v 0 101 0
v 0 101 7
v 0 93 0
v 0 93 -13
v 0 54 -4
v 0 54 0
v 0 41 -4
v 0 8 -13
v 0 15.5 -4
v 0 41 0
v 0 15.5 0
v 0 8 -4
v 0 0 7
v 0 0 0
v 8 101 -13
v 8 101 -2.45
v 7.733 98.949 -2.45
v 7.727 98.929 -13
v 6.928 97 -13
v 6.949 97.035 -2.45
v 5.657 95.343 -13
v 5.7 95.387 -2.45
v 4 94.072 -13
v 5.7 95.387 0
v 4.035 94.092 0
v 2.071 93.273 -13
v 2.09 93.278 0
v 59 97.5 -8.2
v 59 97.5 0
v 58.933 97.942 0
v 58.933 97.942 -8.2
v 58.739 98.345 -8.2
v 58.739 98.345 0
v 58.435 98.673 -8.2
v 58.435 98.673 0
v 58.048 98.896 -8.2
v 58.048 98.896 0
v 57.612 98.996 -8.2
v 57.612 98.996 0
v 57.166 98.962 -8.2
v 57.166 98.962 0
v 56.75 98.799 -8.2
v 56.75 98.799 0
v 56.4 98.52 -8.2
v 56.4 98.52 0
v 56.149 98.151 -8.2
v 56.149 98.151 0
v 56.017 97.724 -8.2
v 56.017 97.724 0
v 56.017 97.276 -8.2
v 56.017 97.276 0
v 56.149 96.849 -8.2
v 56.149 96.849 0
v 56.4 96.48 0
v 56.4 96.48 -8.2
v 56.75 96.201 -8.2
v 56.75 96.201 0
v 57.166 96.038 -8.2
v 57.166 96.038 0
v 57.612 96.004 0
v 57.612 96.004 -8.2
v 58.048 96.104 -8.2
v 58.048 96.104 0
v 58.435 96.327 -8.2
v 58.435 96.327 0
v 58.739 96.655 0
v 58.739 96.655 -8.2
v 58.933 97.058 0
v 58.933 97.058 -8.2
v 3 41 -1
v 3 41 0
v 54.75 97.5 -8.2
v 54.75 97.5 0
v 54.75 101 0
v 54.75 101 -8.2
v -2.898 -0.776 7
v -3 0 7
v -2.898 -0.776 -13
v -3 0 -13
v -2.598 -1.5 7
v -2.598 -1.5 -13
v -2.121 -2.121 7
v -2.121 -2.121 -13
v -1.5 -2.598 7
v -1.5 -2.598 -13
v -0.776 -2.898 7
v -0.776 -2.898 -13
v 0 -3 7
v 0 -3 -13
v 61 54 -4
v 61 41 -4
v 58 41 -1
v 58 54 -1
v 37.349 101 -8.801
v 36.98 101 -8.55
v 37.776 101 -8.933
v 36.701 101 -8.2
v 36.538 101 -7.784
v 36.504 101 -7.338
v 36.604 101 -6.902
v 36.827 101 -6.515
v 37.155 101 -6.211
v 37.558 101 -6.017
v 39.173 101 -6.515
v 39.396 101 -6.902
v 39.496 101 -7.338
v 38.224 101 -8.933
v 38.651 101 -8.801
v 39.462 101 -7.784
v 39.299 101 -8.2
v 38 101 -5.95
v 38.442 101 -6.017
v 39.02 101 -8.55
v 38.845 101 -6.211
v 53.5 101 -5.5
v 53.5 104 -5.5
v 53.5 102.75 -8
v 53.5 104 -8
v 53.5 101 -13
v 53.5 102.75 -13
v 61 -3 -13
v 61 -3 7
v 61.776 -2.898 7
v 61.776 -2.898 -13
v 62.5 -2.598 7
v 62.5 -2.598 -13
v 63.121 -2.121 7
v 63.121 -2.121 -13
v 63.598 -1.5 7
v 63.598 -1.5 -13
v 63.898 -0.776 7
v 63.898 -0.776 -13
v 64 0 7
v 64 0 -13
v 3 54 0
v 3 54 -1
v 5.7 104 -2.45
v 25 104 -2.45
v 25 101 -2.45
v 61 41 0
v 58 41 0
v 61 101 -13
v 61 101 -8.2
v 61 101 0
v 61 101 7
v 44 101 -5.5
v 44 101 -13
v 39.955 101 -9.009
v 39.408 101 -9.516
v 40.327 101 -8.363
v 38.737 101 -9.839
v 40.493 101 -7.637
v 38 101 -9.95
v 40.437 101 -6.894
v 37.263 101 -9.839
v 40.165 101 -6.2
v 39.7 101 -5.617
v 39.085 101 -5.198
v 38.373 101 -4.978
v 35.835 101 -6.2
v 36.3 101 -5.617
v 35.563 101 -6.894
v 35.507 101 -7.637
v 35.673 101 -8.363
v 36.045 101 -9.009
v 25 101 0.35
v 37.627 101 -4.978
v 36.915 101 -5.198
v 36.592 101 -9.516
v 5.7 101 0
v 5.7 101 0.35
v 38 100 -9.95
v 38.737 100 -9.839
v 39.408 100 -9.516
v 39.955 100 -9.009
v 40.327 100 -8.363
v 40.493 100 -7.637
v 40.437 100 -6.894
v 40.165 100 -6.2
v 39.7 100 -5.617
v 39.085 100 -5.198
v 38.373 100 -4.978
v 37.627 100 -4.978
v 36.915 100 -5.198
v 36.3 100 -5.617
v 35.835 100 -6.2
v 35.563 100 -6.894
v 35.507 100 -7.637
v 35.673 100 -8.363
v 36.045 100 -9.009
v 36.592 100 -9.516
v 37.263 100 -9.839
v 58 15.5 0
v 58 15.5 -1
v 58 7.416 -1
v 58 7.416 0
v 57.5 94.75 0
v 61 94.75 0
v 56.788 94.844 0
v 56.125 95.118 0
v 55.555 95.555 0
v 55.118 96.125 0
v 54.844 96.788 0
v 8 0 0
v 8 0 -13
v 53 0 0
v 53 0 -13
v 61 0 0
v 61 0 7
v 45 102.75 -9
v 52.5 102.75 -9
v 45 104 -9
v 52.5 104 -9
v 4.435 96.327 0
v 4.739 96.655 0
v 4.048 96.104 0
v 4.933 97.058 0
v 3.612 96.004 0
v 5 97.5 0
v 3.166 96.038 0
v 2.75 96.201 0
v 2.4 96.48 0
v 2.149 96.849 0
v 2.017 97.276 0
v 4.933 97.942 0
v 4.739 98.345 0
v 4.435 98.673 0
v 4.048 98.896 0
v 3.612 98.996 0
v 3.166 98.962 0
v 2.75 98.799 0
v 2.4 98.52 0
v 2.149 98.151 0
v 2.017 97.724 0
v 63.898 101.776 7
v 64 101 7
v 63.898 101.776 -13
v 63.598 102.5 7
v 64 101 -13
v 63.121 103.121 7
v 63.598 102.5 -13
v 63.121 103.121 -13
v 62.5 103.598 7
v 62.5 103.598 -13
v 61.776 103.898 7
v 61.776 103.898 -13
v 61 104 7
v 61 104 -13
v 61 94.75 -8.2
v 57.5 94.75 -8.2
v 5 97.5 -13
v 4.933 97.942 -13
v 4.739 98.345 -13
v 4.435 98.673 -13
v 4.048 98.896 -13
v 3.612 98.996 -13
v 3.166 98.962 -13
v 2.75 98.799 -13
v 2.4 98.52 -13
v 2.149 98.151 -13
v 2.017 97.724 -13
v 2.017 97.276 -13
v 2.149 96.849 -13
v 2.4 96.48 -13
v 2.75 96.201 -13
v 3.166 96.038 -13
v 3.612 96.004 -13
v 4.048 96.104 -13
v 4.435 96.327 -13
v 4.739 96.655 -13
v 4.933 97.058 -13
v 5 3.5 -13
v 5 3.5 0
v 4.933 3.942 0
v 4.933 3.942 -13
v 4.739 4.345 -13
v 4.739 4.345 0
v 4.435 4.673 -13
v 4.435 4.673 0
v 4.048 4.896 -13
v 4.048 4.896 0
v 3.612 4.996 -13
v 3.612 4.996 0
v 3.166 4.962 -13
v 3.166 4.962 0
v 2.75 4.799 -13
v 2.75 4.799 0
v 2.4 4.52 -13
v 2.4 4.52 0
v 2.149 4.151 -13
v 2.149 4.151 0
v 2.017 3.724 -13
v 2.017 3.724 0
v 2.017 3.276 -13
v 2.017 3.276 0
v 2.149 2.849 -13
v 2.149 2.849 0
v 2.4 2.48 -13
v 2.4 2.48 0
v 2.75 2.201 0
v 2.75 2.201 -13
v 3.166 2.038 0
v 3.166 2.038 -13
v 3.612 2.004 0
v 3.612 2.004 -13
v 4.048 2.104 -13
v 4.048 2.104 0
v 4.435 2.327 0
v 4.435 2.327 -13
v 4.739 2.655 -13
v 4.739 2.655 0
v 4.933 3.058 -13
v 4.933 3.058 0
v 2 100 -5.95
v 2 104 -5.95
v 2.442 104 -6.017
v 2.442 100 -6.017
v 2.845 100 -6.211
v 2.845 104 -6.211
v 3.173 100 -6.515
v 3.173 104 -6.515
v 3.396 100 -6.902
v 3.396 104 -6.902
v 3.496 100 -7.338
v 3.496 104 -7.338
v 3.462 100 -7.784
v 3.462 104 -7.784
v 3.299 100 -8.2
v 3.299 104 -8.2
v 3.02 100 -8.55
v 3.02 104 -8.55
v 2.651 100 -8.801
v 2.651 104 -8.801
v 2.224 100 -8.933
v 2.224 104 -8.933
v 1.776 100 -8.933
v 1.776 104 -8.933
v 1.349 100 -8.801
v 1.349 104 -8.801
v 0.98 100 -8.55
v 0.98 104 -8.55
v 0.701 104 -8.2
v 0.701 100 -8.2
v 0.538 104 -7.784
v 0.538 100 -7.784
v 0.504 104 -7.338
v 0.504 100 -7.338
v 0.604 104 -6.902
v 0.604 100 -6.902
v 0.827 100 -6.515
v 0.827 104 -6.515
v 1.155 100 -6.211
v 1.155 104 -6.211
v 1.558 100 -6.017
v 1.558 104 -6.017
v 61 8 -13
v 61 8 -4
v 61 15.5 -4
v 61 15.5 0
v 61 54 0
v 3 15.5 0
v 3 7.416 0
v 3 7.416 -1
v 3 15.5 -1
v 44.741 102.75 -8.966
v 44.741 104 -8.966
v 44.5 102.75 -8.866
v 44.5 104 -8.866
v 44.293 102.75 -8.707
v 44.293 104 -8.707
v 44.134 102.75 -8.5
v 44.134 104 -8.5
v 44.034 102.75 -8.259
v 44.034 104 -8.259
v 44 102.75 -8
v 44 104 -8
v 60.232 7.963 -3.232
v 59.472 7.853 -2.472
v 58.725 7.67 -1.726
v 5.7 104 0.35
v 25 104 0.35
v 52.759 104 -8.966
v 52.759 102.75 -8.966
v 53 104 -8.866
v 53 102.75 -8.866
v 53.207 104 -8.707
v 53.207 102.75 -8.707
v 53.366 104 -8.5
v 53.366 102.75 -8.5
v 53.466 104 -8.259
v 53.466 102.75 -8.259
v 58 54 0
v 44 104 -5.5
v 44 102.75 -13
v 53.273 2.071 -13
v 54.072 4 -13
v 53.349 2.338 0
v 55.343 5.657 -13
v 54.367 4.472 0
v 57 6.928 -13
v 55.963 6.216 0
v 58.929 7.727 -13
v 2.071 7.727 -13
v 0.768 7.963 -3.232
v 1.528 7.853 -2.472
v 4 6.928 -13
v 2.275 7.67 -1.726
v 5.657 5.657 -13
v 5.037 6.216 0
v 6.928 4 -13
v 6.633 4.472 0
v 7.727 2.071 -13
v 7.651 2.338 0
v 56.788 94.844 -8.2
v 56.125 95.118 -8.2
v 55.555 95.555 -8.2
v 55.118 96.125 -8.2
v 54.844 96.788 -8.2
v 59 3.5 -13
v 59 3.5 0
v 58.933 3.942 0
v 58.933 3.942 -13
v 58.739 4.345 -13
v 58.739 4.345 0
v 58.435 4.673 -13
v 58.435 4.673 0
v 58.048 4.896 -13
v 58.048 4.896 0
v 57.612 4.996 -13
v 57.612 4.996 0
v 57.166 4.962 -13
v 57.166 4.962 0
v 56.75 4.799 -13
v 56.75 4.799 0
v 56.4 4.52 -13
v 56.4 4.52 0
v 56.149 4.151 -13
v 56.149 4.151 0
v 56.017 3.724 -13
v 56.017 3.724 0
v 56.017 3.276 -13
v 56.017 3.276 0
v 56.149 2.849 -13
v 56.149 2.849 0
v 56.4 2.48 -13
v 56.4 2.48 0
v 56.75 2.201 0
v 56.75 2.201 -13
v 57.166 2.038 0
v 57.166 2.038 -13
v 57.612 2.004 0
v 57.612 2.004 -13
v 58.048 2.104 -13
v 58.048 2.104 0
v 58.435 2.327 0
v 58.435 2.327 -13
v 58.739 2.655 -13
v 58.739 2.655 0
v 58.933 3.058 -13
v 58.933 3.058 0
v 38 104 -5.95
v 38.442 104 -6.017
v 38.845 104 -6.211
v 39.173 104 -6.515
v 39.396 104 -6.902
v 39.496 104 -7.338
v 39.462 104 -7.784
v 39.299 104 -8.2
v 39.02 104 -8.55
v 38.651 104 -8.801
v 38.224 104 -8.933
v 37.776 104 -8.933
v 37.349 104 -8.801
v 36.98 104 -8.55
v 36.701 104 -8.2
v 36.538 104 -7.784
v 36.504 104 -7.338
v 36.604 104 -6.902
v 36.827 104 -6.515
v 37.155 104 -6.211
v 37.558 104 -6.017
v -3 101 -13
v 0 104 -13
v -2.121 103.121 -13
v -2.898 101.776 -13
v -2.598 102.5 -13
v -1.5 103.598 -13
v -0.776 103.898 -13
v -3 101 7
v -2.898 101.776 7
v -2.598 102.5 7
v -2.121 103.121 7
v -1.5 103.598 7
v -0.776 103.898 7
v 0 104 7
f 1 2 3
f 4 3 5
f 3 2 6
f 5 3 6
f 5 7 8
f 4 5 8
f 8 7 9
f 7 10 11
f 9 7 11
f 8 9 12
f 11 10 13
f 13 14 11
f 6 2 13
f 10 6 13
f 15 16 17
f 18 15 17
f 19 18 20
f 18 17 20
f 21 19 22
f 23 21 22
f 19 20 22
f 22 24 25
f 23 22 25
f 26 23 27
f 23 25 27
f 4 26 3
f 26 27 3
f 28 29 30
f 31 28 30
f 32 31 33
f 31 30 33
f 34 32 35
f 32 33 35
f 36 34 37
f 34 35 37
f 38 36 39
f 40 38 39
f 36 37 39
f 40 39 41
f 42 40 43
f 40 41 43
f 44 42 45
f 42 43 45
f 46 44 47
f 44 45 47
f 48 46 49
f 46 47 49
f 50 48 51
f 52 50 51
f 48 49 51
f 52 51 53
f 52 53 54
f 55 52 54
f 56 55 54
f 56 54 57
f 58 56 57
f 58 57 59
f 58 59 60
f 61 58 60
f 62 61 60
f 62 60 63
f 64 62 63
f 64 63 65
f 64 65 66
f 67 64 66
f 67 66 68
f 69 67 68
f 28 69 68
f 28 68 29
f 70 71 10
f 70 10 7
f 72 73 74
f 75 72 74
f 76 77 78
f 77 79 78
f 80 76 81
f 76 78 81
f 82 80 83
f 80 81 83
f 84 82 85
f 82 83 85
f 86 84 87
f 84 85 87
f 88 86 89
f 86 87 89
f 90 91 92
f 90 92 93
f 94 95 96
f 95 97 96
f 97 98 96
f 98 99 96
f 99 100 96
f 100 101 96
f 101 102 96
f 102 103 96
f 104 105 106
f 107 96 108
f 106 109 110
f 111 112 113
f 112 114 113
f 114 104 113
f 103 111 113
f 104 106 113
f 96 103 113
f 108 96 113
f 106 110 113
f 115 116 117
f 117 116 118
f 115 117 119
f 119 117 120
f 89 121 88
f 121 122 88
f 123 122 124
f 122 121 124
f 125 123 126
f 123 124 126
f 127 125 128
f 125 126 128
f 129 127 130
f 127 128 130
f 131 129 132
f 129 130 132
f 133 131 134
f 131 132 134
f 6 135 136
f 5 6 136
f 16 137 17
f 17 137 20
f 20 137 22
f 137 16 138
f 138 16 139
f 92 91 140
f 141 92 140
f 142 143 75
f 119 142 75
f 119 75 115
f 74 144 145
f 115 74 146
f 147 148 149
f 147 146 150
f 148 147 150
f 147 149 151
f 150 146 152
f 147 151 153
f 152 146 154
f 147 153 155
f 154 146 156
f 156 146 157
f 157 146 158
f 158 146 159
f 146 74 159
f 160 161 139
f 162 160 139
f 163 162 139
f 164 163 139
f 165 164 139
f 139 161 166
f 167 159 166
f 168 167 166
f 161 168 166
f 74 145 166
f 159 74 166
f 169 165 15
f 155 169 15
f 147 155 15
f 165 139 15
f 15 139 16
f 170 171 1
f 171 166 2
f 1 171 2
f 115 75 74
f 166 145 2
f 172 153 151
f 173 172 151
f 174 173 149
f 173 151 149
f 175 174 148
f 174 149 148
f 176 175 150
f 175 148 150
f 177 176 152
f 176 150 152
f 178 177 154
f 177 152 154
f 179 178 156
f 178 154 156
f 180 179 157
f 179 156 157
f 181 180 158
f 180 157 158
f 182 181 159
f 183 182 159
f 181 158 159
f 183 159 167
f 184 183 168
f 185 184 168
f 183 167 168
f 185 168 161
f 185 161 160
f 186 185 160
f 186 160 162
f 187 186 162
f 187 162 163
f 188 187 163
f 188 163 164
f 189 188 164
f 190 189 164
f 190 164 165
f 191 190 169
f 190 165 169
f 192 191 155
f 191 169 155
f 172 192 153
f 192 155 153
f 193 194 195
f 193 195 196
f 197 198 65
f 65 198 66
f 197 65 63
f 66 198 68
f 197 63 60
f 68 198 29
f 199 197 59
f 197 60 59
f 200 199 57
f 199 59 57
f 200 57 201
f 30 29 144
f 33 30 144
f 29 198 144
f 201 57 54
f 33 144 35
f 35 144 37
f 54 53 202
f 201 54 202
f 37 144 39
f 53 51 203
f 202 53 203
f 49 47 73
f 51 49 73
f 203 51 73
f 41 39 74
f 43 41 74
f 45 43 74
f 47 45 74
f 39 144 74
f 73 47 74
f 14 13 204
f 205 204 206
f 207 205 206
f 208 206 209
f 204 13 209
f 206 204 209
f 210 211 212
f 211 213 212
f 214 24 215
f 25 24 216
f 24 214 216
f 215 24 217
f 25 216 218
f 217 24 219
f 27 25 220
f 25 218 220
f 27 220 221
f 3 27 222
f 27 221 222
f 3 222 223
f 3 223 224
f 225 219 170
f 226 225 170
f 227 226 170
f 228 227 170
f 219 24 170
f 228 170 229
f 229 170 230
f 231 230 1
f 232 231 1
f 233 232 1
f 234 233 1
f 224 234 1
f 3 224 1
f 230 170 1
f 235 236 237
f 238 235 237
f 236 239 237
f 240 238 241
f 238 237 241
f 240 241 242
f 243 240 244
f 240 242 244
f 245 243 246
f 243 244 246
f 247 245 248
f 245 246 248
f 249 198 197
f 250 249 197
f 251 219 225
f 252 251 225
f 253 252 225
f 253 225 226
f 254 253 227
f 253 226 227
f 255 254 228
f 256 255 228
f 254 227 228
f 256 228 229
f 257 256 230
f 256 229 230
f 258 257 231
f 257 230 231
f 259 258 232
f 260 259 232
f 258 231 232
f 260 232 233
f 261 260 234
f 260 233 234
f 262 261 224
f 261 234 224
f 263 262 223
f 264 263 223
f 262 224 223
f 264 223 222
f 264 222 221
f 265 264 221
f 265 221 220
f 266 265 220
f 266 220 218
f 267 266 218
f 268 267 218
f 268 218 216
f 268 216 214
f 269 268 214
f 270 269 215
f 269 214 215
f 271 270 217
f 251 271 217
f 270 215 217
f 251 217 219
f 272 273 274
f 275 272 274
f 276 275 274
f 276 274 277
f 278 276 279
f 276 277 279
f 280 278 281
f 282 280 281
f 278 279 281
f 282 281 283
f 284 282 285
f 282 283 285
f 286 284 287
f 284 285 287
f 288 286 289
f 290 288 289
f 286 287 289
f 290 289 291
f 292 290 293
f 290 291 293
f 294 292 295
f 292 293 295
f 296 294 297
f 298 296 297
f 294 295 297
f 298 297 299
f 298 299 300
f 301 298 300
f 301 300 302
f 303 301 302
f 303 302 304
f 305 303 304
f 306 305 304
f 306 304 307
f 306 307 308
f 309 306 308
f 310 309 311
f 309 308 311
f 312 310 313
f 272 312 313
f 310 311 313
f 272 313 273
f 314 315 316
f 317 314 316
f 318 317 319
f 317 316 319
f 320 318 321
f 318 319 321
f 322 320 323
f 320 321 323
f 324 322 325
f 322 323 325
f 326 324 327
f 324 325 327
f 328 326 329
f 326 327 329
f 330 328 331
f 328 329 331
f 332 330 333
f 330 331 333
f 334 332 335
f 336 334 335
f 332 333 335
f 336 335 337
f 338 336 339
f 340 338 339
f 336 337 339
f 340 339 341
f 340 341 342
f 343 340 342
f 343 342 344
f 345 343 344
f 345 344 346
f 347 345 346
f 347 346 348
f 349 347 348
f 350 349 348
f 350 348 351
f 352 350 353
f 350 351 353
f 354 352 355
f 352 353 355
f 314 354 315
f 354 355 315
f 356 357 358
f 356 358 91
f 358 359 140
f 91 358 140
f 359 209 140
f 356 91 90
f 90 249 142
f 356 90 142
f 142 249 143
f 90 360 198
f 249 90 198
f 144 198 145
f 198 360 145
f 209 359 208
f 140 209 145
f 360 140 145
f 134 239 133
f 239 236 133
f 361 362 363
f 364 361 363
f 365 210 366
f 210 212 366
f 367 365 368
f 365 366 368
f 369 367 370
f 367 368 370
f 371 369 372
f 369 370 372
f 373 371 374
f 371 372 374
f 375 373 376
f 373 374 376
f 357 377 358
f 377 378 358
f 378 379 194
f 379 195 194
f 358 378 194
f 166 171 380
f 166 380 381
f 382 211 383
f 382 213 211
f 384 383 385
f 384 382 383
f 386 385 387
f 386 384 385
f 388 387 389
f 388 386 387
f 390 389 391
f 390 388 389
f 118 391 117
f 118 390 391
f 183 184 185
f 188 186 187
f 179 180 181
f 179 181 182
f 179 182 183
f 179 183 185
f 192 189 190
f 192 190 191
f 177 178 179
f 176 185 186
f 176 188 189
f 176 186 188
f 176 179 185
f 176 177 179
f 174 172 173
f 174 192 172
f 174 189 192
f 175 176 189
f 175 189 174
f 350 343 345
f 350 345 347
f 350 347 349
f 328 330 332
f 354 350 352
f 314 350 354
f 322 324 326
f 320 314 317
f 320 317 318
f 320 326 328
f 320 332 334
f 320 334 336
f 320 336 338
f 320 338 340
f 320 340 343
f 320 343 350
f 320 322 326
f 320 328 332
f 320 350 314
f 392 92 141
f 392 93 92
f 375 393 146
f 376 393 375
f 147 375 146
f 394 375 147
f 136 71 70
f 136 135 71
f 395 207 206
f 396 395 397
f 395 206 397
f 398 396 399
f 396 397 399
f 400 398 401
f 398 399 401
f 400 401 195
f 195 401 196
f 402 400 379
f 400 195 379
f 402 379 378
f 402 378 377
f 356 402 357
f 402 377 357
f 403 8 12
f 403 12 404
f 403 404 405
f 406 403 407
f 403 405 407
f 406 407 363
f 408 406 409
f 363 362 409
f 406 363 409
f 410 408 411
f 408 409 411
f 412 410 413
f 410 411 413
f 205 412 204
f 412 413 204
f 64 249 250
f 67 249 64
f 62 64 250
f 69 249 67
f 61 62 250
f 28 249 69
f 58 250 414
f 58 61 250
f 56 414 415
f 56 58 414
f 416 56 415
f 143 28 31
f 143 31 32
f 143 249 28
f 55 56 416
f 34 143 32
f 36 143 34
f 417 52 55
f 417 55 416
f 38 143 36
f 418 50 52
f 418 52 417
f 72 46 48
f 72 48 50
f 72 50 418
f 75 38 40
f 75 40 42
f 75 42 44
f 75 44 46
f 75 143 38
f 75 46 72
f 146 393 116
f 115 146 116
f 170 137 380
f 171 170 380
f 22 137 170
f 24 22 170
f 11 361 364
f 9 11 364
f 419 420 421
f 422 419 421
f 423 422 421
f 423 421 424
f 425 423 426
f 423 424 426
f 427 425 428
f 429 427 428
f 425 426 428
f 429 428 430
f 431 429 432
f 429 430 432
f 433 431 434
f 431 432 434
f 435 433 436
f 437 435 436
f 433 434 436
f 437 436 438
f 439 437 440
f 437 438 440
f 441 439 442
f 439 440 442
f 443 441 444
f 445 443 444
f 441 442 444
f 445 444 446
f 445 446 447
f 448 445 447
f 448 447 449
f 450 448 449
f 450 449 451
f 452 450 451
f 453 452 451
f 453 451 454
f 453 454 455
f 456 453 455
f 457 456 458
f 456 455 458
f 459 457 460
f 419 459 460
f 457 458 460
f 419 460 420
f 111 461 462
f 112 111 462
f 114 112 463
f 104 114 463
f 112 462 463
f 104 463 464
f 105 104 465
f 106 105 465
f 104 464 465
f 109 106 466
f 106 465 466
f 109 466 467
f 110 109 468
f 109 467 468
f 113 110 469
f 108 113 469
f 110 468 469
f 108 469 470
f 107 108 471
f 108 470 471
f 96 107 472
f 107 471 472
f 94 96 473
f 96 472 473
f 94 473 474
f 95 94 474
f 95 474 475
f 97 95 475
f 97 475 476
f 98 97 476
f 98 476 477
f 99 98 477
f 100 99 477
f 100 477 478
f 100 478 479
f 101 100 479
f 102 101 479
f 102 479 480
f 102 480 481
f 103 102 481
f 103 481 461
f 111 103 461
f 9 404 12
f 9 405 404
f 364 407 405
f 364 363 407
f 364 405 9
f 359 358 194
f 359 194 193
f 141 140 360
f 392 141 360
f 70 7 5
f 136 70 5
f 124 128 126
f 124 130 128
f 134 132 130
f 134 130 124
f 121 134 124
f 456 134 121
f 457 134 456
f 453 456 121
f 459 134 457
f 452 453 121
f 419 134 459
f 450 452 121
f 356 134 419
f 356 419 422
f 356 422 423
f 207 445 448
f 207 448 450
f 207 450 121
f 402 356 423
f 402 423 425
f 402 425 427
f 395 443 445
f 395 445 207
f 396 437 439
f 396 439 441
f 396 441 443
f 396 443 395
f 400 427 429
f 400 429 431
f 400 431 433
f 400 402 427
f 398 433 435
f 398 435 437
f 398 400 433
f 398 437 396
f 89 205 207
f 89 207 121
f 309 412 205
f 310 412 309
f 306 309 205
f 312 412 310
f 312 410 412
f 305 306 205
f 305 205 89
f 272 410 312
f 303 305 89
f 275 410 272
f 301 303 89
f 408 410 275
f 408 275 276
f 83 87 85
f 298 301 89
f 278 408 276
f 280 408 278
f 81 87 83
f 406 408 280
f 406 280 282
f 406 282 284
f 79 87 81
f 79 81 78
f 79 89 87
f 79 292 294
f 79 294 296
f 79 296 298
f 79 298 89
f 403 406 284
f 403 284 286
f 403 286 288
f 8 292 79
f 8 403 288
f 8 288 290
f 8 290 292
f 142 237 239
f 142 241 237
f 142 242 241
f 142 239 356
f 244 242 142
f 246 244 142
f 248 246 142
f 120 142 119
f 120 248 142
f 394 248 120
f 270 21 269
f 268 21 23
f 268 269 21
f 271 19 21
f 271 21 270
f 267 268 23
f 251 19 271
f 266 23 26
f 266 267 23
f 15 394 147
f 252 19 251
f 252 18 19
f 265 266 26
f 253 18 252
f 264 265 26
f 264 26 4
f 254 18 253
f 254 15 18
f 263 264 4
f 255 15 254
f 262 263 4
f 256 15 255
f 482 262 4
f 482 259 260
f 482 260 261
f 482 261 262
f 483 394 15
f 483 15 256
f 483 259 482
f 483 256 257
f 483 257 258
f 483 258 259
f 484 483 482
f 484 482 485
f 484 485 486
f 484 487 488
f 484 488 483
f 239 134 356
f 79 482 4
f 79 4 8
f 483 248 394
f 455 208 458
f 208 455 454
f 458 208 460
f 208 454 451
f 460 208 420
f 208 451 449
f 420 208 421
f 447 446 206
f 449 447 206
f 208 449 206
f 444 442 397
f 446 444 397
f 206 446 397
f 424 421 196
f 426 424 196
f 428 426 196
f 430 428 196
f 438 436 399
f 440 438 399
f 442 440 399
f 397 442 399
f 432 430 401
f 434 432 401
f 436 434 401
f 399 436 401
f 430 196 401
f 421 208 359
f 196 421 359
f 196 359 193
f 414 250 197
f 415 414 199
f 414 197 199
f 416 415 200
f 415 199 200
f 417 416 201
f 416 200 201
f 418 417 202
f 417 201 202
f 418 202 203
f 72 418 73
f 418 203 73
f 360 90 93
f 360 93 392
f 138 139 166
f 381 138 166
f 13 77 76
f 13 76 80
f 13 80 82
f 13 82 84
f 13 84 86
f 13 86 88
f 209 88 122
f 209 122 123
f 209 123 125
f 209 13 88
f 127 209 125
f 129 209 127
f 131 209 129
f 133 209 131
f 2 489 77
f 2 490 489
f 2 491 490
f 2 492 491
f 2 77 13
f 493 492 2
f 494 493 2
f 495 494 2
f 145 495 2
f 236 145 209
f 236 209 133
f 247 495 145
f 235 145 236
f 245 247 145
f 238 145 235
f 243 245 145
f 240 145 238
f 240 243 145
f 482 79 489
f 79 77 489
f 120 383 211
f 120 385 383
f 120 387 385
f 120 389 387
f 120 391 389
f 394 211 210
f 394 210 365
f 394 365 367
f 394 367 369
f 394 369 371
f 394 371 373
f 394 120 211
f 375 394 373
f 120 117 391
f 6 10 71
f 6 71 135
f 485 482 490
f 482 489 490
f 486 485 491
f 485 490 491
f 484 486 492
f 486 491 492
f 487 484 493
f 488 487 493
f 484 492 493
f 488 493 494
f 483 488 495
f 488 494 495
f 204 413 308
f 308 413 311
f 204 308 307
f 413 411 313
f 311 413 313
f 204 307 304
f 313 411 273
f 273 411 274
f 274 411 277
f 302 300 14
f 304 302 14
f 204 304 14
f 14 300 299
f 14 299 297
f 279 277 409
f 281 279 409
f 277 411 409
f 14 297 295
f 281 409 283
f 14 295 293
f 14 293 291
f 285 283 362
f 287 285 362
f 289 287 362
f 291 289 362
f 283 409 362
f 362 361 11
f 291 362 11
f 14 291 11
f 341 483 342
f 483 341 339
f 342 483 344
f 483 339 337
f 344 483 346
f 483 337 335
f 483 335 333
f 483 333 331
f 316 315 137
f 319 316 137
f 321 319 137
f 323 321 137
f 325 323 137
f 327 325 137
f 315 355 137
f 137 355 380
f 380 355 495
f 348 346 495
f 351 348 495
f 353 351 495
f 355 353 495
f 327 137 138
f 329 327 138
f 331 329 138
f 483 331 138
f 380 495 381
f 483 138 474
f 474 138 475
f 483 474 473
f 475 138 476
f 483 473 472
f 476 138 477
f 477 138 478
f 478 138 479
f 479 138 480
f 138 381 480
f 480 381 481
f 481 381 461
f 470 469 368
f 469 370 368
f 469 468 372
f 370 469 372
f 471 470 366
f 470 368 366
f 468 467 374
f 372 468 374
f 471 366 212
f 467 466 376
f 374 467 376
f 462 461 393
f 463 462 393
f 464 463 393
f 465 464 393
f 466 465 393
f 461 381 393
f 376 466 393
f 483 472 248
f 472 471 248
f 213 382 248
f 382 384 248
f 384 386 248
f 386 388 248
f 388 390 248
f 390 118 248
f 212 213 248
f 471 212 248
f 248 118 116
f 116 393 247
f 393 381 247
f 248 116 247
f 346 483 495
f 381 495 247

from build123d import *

# Parameters (mm, degrees)
SKICA1_W                 = 67
SKICA1_H                 = 107
SKICA1_W_2               = 61
SKICA1_H_2               = 101
P_IDAT_VYSUNUT_M1_DEPTH  = 7
P_IDAT_VYSUNUT_M2_DEPTH  = 13
SKICA3_R                 = 1.5
ODEBRAT_VYSUNUT_M1_DEPTH = 13
ODEBRAT_START            = -4.8
ODEBRAT_VYSUNUT_M2_DEPTH = 4.8
ODEBRAT_VYSUNUT_M4_DEPTH = 123.804723036
ZAOBLIT1_R               = 3
SKICA5_W                 = 4
SKICA5_H                 = 8.5
SKICA5_H_2               = 13
P_IDAT_VYSUNUT_M3_DEPTH  = 3
ZKOSEN_1_SIZE            = 3
SKICA6_W                 = 4
SKICA6_H                 = 8.5
SKICA6_H_2               = 13
P_IDAT_VYSUNUT_M4_DEPTH  = 3
ZKOSEN_2_SIZE            = 3
SKICA7_W                 = 9.5
SKICA7_H                 = 7.5
ODEBRAT_VYSUNUT_M3_DEPTH = 10
SKICA9_W                 = 9.5
SKICA9_H                 = 1.25
P_IDAT_VYSUNUT_M5_DEPTH  = 4
ZAOBLIT2_R               = 1
SKICA10_W                = 19.3
SKICA10_H                = 2.8
ODEBRAT_VYSUNUT_M5_DEPTH = 6
SKICA11_R                = 1.5
ODEBRAT_VYSUNUT_M6_DEPTH = 4
SKICA13_R                = 2.5
P_IDAT_VYSUNUT_M6_DEPTH  = 1


with BuildPart() as part:
    # Skica1 → Přidat vysunutím1 (new body)
    with BuildSketch(Plane.XY):
        with Locations((30.5, 50.5)):
            Rectangle(SKICA1_W, SKICA1_H)
        with Locations((30.5, 50.5)):
            Rectangle(SKICA1_W_2, SKICA1_H_2, mode=Mode.SUBTRACT)
    extrude(amount=P_IDAT_VYSUNUT_M1_DEPTH)

    # Skica2 → Přidat vysunutím2 (add)
    with BuildSketch(Plane(origin=(0, 0, 0), x_dir=(-1, 0, 0), z_dir=(0, 0, -1))):
        with BuildLine():
            ThreePointArc((-53, 0), (-53.14730658, -1.5281381), (-53.583801513, -3))
            Line((-53.583801513, -3), (-7.416198487, -3))
            ThreePointArc((-7.416198487, -3), (-7.85269342, -1.5281381), (-8, 0))
            Line((-8, 0), (-53, 0))
        make_face()
        with BuildLine():
            ThreePointArc((-61, 8), (-62.5281381, 7.85269342), (-64, 7.416198487))
            Line((-64, 7.416198487), (-64, -3))
            Line((-64, -3), (-53.583801513, -3))
            ThreePointArc((-53.583801513, -3), (-53.14730658, -1.5281381), (-53, 0))
            Line((-53, 0), (-61, 0))
            Line((-61, 0), (-61, 8))
        make_face()
        with BuildLine():
            ThreePointArc((-53, 0), (-55.343145751, 5.656854249), (-61, 8))
            Line((-61, 8), (-61, 0))
            Line((-61, 0), (-53, 0))
        make_face()
        with BuildLine():
            ThreePointArc((-61, 93), (-62.5281381, 93.14730658), (-64, 93.583801513))
            Line((-64, 93.583801513), (-64, 7.416198487))
            ThreePointArc((-64, 7.416198487), (-62.5281381, 7.85269342), (-61, 8))
            Line((-61, 8), (-61, 93))
        make_face()
        with BuildLine():
            Line((-53.583801513, 104), (-64, 104))
            Line((-64, 104), (-64, 93.583801513))
            ThreePointArc((-64, 93.583801513), (-62.5281381, 93.14730658), (-61, 93))
            Line((-61, 93), (-61, 101))
            Line((-61, 101), (-53, 101))
            ThreePointArc((-53, 101), (-53.14730658, 102.5281381), (-53.583801513, 104))
        make_face()
        with BuildLine():
            ThreePointArc((-61, 93), (-55.343145751, 95.343145751), (-53, 101))
            Line((-53, 101), (-61, 101))
            Line((-61, 101), (-61, 93))
        make_face()
        with BuildLine():
            Line((-7.416198487, 104), (-53.583801513, 104))
            ThreePointArc((-53.583801513, 104), (-53.14730658, 102.5281381), (-53, 101))
            Line((-53, 101), (-8, 101))
            ThreePointArc((-8, 101), (-7.85269342, 102.5281381), (-7.416198487, 104))
        make_face()
        with BuildLine():
            Line((3, 104), (-7.416198487, 104))
            ThreePointArc((-7.416198487, 104), (-7.85269342, 102.5281381), (-8, 101))
            Line((-8, 101), (0, 101))
            Line((0, 101), (0, 93))
            ThreePointArc((0, 93), (1.5281381, 93.14730658), (3, 93.583801513))
            Line((3, 93.583801513), (3, 104))
        make_face()
        with BuildLine():
            Line((0, 101), (-8, 101))
            ThreePointArc((-8, 101), (-5.656854249, 95.343145751), (0, 93))
            Line((0, 93), (0, 101))
        make_face()
        with BuildLine():
            Line((3, 7.416198487), (3, 93.583801513))
            ThreePointArc((3, 93.583801513), (1.5281381, 93.14730658), (0, 93))
            Line((0, 93), (0, 8))
            ThreePointArc((0, 8), (1.5281381, 7.85269342), (3, 7.416198487))
        make_face()
        with BuildLine():
            Line((3, -3), (3, 7.416198487))
            ThreePointArc((3, 7.416198487), (1.5281381, 7.85269342), (0, 8))
            Line((0, 8), (0, 0))
            Line((0, 0), (-8, 0))
            ThreePointArc((-8, 0), (-7.85269342, -1.5281381), (-7.416198487, -3))
            Line((-7.416198487, -3), (3, -3))
        make_face()
        with BuildLine():
            Line((0, 0), (0, 8))
            ThreePointArc((0, 8), (-5.656854249, 5.656854249), (-8, 0))
            Line((-8, 0), (0, 0))
        make_face()
    extrude(amount=P_IDAT_VYSUNUT_M2_DEPTH)

    # Skica3 → Odebrat vysunutím1 (cut)
    with BuildSketch(Plane.XY):
        with Locations((3.5, 97.5)):
            Circle(SKICA3_R)
        with Locations((3.5, 3.5)):
            Circle(SKICA3_R)
        with Locations((57.5, 3.5)):
            Circle(SKICA3_R)
        with Locations((57.5, 97.5)):
            Circle(SKICA3_R)
    extrude(amount=-ODEBRAT_VYSUNUT_M1_DEPTH, mode=Mode.SUBTRACT)

    # Skica4 → Odebrat vysunutím2 (cut)
    with BuildSketch(Plane(origin=(0, 0, -13), x_dir=(-1, 0, 0), z_dir=(0, 0, -1)).offset(ODEBRAT_START)):
        with BuildLine():
            Line((-53, 101), (-61, 101))
            Line((-61, 101), (-61, 93))
            ThreePointArc((-61, 93), (-55.343145751, 95.343145751), (-53, 101))
        make_face()
    extrude(amount=ODEBRAT_VYSUNUT_M2_DEPTH, mode=Mode.SUBTRACT)

    # Skica8 → Odebrat vysunutím4 (cut, through all)
    with BuildSketch(Plane.XY):
        with BuildLine():
            Line((61, 94.75), (57.5, 94.75))
            ThreePointArc((57.5, 94.75), (55.555456352, 95.555456352), (54.75, 97.5))
            Line((54.75, 97.5), (54.75, 101))
            Line((54.75, 101), (53, 101))
            ThreePointArc((53, 101), (55.343145751, 95.343145751), (61, 93))
            Line((61, 93), (61, 94.75))
        make_face()
    extrude(amount=-ODEBRAT_VYSUNUT_M4_DEPTH, mode=Mode.SUBTRACT)

    # Zaoblit1
    zaoblit1_edges = [part.edges().sort_by_distance(p)[0] for p in [
        (-3, 104, -3),
        (64, 104, -3),
        (64, -3, -3),
        (-3, -3, -3),
    ]]
    fillet(zaoblit1_edges, radius=ZAOBLIT1_R)

    # Skica5 → Přidat vysunutím3 (add)
    with BuildSketch(Plane(origin=(0, 0, 0), x_dir=(0, 0, -1), z_dir=(1, 0, 0))):
        with Locations((2, 11.25)):
            Rectangle(SKICA5_W, SKICA5_H)
        with Locations((2, 47.5)):
            Rectangle(SKICA5_W, SKICA5_H_2)
    extrude(amount=P_IDAT_VYSUNUT_M3_DEPTH)

    # Zkosení1
    zkosen_1_edges = [part.edges().sort_by_distance(p)[0] for p in [
        (3, 11.458099244, -4),
        (3, 47.5, -4),
    ]]
    chamfer(zkosen_1_edges, length=ZKOSEN_1_SIZE - 0.0001)  # a hair under: the kernel refuses the full size

    # Skica6 → Přidat vysunutím4 (add)
    with BuildSketch(Plane.ZY.offset(-61)):
        with Locations((-2, 11.25)):
            Rectangle(SKICA6_W, SKICA6_H)
        with Locations((-2, 47.5)):
            Rectangle(SKICA6_W, SKICA6_H_2)
    extrude(amount=P_IDAT_VYSUNUT_M4_DEPTH)

    # Zkosení2
    zkosen_2_edges = [part.edges().sort_by_distance(p)[0] for p in [
        (58, 11.458099244, -4),
        (58, 47.5, -4),
    ]]
    chamfer(zkosen_2_edges, length=ZKOSEN_2_SIZE - 0.0001)  # a hair under: the kernel refuses the full size

    # Skica7 → Odebrat vysunutím3 (cut)
    with BuildSketch(Plane(origin=(0, 104, 0), x_dir=(1, 0, 0), z_dir=(0, 1, 0))):
        with Locations((48.75, 9.25)):
            Rectangle(SKICA7_W, SKICA7_H)
    extrude(amount=-ODEBRAT_VYSUNUT_M3_DEPTH, mode=Mode.SUBTRACT)

    # Skica9 → Přidat vysunutím5 (add)
    with BuildSketch(Plane(origin=(0, 0, -13), x_dir=(-1, 0, 0), z_dir=(0, 0, -1))):
        with Locations((-48.75, 103.375)):
            Rectangle(SKICA9_W, SKICA9_H)
    extrude(amount=-P_IDAT_VYSUNUT_M5_DEPTH)

    # Zaoblit2
    zaoblit2_edges = [part.edges().sort_by_distance(p)[0] for p in [
        (53.5, 103.375, -9),
        (44, 103.375, -9),
    ]]
    fillet(zaoblit2_edges, radius=ZAOBLIT2_R)

    # Skica10 → Odebrat vysunutím5 (cut, symmetric)
    with BuildSketch(Plane.XZ.offset(-101)):
        with Locations((15.35, -1.05)):
            Rectangle(SKICA10_W, SKICA10_H)
    extrude(amount=ODEBRAT_VYSUNUT_M5_DEPTH, both=True, mode=Mode.SUBTRACT)

    # Skica11 → Odebrat vysunutím6 (cut)
    with BuildSketch(Plane(origin=(0, 104, 0), x_dir=(1, 0, 0), z_dir=(0, 1, 0))):
        with Locations(Location((38, 7.45, 0), (0, 0, 270))):
            Circle(SKICA11_R)
        with Locations(Location((2, 7.45, 0), (0, 0, 270))):
            Circle(SKICA11_R)
    extrude(amount=-ODEBRAT_VYSUNUT_M6_DEPTH, mode=Mode.SUBTRACT)

    # Skica13 → Přidat vysunutím6 (add)
    with BuildSketch(Plane.XZ.offset(-101)):
        with Locations(Location((38, -7.45, 0), (0, 0, 270))):
            Circle(SKICA13_R)
    extrude(amount=P_IDAT_VYSUNUT_M6_DEPTH)


solid = part.part
